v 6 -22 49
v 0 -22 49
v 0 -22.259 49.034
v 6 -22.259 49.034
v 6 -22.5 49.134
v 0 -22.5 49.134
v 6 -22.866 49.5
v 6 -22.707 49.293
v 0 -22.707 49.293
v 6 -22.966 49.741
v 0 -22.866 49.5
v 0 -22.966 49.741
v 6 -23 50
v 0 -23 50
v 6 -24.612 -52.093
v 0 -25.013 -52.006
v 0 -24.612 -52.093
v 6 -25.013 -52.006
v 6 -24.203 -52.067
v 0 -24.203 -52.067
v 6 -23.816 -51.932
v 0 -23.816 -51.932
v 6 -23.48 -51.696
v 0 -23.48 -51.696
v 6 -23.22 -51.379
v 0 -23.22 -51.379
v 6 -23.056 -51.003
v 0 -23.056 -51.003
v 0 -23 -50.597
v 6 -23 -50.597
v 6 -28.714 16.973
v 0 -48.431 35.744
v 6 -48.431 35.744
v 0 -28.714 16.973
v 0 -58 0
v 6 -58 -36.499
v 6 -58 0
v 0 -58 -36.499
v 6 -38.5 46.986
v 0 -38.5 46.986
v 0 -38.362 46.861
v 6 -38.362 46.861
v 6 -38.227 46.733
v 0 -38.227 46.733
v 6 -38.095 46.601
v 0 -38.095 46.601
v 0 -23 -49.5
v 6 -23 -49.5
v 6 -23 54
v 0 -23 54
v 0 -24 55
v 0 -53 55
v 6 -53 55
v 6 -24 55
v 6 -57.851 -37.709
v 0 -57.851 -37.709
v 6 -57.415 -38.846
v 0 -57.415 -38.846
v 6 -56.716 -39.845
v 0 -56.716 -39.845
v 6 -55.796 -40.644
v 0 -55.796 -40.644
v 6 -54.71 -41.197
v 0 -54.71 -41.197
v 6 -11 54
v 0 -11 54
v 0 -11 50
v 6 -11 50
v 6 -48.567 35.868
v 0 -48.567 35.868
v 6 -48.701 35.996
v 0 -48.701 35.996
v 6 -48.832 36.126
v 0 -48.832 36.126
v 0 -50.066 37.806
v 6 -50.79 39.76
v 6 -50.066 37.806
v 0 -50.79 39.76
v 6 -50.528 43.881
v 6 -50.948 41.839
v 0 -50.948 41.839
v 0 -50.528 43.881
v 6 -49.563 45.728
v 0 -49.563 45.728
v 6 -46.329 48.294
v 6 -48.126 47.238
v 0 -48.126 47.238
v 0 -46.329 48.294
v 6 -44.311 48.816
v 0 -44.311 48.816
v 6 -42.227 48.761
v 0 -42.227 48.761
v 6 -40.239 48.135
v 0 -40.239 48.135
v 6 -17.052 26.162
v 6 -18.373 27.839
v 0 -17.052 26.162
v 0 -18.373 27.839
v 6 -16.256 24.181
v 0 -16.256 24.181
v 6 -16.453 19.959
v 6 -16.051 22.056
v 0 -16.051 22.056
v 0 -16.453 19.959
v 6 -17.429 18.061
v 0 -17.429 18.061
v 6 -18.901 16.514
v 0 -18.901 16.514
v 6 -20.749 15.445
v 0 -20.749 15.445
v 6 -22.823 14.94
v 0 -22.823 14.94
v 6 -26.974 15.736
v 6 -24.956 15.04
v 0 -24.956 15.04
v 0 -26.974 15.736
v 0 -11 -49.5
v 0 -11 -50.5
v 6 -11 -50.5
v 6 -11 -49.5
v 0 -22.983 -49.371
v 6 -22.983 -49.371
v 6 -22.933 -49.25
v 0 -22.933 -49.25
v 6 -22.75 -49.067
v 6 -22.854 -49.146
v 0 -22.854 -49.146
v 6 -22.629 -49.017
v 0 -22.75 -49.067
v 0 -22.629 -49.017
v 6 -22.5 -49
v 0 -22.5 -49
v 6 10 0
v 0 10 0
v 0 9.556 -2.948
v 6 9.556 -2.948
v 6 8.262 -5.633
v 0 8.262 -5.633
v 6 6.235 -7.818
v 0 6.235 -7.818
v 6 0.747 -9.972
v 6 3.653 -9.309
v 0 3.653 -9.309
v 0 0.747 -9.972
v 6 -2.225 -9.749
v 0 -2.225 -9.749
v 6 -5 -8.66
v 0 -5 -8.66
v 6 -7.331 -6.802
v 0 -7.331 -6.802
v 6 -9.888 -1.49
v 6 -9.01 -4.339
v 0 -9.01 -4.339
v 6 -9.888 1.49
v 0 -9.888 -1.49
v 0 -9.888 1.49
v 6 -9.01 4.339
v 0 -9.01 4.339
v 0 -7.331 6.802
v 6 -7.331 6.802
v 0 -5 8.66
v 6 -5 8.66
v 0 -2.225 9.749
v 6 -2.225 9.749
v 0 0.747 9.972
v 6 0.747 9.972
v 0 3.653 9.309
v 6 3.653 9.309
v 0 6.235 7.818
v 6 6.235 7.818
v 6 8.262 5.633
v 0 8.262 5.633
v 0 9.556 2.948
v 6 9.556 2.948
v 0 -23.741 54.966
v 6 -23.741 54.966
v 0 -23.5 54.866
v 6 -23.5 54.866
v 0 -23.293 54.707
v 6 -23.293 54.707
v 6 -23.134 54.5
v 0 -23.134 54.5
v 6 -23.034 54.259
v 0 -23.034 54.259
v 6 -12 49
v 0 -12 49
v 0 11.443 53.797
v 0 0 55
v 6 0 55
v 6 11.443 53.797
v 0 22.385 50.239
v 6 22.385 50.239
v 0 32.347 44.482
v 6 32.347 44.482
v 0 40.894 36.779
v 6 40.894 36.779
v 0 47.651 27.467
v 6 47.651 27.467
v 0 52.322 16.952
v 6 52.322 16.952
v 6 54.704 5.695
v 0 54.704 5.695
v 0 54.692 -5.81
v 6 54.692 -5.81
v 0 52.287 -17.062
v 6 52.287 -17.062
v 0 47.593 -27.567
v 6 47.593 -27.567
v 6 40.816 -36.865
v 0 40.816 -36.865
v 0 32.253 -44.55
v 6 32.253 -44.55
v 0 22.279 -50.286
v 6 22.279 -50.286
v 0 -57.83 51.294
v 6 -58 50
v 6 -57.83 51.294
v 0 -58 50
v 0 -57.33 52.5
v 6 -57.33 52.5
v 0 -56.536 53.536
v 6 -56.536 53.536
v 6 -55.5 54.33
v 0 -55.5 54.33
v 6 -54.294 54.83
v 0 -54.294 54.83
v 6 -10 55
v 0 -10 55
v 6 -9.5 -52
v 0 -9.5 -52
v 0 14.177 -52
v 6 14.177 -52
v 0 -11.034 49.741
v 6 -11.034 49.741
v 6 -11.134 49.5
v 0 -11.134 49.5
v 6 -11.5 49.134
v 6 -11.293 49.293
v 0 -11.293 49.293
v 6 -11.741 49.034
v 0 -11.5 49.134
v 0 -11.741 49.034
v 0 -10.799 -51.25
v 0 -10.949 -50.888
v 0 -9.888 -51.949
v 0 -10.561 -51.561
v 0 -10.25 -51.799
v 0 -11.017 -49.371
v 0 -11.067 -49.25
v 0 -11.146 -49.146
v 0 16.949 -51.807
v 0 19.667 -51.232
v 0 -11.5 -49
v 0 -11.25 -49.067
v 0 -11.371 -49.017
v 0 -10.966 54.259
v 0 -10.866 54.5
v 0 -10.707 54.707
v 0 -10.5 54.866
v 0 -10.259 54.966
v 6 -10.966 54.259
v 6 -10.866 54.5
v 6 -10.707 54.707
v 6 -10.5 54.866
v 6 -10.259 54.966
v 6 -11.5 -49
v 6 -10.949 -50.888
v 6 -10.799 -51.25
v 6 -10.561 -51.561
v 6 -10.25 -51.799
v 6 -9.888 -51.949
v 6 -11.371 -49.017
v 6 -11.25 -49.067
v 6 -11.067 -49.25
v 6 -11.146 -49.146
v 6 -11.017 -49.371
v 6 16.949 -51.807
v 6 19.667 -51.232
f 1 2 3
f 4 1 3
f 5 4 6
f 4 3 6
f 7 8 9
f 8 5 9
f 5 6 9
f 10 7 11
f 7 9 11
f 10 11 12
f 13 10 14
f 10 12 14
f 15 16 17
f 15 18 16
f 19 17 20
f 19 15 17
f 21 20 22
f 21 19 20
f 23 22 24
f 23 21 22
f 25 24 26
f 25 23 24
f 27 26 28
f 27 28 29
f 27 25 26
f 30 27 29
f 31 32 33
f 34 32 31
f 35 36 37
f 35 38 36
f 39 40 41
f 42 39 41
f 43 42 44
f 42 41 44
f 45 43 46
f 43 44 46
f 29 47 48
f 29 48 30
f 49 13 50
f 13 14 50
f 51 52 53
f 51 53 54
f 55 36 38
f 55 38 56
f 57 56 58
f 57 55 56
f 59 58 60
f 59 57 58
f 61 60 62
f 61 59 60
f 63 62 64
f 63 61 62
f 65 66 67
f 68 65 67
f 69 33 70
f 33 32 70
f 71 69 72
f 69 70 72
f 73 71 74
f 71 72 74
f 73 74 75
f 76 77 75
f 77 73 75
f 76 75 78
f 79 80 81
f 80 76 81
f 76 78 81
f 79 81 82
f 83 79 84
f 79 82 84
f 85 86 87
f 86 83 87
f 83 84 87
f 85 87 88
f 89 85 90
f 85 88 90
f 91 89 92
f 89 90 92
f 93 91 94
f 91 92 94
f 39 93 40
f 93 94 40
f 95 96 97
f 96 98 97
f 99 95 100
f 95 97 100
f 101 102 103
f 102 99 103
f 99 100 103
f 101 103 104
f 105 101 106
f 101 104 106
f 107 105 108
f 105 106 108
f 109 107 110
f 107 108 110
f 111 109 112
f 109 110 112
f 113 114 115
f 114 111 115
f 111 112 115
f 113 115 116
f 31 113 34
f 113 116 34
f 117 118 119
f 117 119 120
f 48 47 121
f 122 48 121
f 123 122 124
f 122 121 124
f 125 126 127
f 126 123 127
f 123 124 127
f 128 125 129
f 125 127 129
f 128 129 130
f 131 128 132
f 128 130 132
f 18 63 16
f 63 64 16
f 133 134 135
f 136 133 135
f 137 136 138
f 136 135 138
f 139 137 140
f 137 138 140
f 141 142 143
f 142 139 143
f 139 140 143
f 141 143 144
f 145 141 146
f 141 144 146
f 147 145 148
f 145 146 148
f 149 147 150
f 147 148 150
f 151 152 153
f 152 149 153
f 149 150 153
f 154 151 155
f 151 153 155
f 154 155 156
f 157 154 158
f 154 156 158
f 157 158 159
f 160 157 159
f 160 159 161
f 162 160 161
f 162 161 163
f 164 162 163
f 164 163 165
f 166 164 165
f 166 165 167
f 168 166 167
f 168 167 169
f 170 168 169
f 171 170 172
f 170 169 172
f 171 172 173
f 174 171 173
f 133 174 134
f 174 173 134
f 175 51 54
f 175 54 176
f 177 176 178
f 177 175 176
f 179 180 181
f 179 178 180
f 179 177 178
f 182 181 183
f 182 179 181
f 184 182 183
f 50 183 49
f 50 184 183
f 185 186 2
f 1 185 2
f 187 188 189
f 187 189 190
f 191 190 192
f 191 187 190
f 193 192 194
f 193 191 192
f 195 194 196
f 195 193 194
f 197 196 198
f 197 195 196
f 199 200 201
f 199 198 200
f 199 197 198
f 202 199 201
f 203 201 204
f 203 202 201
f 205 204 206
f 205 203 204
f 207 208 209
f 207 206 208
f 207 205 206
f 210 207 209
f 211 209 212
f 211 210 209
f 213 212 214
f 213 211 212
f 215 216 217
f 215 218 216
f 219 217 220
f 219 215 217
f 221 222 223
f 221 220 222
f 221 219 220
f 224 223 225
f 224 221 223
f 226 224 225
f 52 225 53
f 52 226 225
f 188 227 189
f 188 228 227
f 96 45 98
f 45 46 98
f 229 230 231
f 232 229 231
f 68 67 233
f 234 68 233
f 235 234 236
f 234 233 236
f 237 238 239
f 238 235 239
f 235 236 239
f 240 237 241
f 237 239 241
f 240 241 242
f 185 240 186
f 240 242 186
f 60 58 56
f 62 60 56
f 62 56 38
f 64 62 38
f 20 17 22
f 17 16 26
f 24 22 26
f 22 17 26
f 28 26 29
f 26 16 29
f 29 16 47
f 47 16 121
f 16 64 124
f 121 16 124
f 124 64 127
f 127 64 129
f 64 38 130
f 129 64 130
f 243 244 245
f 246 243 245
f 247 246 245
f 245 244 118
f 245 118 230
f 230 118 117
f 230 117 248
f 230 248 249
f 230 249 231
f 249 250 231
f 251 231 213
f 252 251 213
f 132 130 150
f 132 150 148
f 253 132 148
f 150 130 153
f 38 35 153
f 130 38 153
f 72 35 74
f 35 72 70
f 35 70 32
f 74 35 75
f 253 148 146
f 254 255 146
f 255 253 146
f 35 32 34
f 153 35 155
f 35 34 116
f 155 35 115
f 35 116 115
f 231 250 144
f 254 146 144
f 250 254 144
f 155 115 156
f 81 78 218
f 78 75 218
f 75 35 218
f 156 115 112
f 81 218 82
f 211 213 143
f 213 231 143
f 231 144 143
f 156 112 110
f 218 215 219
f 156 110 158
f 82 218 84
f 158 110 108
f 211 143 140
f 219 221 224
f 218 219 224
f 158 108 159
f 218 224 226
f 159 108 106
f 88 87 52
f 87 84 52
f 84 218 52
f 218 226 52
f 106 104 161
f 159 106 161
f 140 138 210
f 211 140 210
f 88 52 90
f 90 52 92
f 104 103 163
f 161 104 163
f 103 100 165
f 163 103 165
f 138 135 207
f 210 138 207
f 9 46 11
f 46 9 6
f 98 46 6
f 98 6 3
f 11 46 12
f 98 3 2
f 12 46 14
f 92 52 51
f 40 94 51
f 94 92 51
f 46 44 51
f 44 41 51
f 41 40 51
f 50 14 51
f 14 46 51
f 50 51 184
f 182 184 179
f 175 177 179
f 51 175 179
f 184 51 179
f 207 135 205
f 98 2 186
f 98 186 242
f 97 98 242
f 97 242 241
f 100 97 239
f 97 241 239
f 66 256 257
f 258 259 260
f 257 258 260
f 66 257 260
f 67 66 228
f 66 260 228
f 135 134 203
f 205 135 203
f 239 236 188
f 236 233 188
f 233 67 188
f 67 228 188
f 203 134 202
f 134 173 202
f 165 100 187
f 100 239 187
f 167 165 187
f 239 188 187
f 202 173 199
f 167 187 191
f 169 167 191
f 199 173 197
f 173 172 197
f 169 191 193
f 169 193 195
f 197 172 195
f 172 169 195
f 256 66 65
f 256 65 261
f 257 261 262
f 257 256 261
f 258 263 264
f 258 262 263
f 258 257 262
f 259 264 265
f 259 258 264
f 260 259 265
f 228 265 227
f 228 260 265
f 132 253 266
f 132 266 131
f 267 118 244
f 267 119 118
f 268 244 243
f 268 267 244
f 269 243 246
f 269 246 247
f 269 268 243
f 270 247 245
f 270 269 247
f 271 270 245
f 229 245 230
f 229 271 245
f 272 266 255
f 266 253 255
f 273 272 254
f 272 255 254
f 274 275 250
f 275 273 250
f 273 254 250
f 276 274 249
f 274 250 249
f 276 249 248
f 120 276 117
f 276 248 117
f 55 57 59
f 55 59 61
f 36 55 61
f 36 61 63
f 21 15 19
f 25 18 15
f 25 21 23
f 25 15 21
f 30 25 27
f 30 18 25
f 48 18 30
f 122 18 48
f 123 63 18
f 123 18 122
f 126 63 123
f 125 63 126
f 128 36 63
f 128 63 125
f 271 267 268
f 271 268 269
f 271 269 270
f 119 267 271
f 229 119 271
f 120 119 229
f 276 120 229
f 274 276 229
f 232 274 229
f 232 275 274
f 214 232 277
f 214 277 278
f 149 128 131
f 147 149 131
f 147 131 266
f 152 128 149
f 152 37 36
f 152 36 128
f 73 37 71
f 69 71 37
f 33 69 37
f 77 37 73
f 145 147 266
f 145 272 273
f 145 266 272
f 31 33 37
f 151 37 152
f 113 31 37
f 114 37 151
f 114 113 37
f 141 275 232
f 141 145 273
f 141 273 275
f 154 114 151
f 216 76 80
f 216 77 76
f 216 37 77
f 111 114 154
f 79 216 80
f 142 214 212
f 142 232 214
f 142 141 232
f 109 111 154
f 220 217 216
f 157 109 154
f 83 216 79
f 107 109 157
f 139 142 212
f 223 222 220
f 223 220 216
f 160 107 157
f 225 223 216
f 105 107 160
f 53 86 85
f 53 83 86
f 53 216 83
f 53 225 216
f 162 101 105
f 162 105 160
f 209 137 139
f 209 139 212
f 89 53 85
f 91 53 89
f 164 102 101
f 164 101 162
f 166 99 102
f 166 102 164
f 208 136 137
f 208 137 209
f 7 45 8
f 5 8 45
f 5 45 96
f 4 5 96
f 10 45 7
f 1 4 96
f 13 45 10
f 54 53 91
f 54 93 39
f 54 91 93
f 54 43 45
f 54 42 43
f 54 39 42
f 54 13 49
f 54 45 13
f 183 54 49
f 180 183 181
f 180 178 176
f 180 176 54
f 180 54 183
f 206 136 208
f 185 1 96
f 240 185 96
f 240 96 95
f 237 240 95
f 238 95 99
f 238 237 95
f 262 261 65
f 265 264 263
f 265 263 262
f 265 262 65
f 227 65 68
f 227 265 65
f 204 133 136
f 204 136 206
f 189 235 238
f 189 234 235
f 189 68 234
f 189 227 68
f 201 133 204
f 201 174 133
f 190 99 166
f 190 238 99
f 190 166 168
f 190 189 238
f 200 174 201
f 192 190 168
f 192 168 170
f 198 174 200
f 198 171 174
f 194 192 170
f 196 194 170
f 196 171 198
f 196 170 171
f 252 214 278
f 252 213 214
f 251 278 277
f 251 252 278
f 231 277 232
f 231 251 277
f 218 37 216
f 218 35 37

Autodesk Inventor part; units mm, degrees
ref_plane "YZ Plane" through (0, 0, 0) normal (1, 0, 0) x (0, 1, 0)
ref_plane "XZ Plane" through (0, 0, 0) normal (0, 1, 0) x (-1, 0, 0)
ref_plane "XY Plane" through (0, 0, 0) normal (0, 0, 1) x (1, 0, 0)
sketch "Sketch1" plane through (0, 0, 0) normal (1, 0, 0) x (0, 1, 0)
  line L0 (-58, -40) -> (-58, 50)
  line L1 (0, 0) -> (-57.3223, 54.5531) construction
  arc A0 (-28.7141, 16.9733) -> (-18.3732, 27.8392) centre (-23.5426, 22.4053) ccw
  circle A1 centre (0, 0) radius 47 construction
  arc A2 (-38.0949, 46.601) -> (-48.4307, 35.7445) centre (-43.4633, 41.3636) ccw
  circle A3 centre (0, 0) radius 10
  line L2 (-11, -52) -> (14.1774, -52)
  line L3 (-58, 0) -> (-58, -40)
  line L4 (0, 0) -> (0, -52) construction
  line L5 (-58, -40) -> (-23, -52.739)
  circle A4 centre (0, 0) radius 50 construction
  arc A5 (22.2788, -50.2857) -> (0, 55) centre (0, 0) ccw
  arc A6 (-53, 55) -> (-58, 50) centre (-53, 50) ccw
  line L6 (-11, 54) -> (-11, 50)
  line L7 (-12, 49) -> (-22, 49)
  line L8 (-23, 50) -> (-23, 54)
  line L9 (-53, 55) -> (-24, 55)
  line L10 (-10, 55) -> (0, 55)
  arc A7 (-23, 54) -> (-24, 55) centre (-24, 54) ccw
  arc A8 (-10, 55) -> (-11, 54) centre (-10, 54) ccw
  arc A9 (-12, 49) -> (-11, 50) centre (-12, 50) ccw
  arc A10 (-23, 50) -> (-22, 49) centre (-22, 50) ccw
  arc A11 (14.1774, -52) -> (22.2788, -50.2857) centre (14.1774, -32) ccw
  line L11 (-23, -49.5) -> (-23, -52.739)
  line L12 (-11, -52) -> (-11, -49.5)
  line L13 (-11.5, -49) -> (-22.5, -49)
  arc A12 (-11, -49.5) -> (-11.5, -49) centre (-11.5, -49.5) ccw
  arc A13 (-22.5, -49) -> (-23, -49.5) centre (-22.5, -49.5) ccw
  line L14 (-38.5, 46.9864) -> (-18.3732, 27.8392)
  line L15 (-48.8316, 36.1262) -> (-28.7141, 16.9733)
  point P0 (-57.7919, 55)
  point P1 (-58, 55)
  point P2 (-25.2108, 39.6663)
  point P3 (17.9165, -52)
  point P4 (-23, 55)
  point P5 (-11, 52)
  dimension "d4" = 94
  dimension "d3" = 32.5
  dimension "d6" = 15
  dimension "d7" = 15
  dimension "d9" = 20
  dimension "d13" = 52
  dimension "d20" = 100
  dimension "d31" = 55
  dimension "d34" = 58
  dimension "d52" = 5
  dimension "d54" = 47
  dimension "d56" = 1
  dimension "d59" = 20
  dimension "d60" = 12
  dimension "d61" = 6
  dimension "d65" = 0.5
  dimension "d69" = 60
  dimension "d72" = 95
  dimension "d74" = 110
  dimension "d75" = 3
  dimension "d76" = 12
  dimension "d77" = 35
extrude "Extrusion4" add sketch "Sketch1" along normal blind 6
fillet "Fillet1" radius 5 1 edges at (3, -58, -40)
fillet "Fillet2" radius 1.5 2 edges at (3, -23, -52.739) (3, -11, -52)
properties part number "MidFlange27130914"
